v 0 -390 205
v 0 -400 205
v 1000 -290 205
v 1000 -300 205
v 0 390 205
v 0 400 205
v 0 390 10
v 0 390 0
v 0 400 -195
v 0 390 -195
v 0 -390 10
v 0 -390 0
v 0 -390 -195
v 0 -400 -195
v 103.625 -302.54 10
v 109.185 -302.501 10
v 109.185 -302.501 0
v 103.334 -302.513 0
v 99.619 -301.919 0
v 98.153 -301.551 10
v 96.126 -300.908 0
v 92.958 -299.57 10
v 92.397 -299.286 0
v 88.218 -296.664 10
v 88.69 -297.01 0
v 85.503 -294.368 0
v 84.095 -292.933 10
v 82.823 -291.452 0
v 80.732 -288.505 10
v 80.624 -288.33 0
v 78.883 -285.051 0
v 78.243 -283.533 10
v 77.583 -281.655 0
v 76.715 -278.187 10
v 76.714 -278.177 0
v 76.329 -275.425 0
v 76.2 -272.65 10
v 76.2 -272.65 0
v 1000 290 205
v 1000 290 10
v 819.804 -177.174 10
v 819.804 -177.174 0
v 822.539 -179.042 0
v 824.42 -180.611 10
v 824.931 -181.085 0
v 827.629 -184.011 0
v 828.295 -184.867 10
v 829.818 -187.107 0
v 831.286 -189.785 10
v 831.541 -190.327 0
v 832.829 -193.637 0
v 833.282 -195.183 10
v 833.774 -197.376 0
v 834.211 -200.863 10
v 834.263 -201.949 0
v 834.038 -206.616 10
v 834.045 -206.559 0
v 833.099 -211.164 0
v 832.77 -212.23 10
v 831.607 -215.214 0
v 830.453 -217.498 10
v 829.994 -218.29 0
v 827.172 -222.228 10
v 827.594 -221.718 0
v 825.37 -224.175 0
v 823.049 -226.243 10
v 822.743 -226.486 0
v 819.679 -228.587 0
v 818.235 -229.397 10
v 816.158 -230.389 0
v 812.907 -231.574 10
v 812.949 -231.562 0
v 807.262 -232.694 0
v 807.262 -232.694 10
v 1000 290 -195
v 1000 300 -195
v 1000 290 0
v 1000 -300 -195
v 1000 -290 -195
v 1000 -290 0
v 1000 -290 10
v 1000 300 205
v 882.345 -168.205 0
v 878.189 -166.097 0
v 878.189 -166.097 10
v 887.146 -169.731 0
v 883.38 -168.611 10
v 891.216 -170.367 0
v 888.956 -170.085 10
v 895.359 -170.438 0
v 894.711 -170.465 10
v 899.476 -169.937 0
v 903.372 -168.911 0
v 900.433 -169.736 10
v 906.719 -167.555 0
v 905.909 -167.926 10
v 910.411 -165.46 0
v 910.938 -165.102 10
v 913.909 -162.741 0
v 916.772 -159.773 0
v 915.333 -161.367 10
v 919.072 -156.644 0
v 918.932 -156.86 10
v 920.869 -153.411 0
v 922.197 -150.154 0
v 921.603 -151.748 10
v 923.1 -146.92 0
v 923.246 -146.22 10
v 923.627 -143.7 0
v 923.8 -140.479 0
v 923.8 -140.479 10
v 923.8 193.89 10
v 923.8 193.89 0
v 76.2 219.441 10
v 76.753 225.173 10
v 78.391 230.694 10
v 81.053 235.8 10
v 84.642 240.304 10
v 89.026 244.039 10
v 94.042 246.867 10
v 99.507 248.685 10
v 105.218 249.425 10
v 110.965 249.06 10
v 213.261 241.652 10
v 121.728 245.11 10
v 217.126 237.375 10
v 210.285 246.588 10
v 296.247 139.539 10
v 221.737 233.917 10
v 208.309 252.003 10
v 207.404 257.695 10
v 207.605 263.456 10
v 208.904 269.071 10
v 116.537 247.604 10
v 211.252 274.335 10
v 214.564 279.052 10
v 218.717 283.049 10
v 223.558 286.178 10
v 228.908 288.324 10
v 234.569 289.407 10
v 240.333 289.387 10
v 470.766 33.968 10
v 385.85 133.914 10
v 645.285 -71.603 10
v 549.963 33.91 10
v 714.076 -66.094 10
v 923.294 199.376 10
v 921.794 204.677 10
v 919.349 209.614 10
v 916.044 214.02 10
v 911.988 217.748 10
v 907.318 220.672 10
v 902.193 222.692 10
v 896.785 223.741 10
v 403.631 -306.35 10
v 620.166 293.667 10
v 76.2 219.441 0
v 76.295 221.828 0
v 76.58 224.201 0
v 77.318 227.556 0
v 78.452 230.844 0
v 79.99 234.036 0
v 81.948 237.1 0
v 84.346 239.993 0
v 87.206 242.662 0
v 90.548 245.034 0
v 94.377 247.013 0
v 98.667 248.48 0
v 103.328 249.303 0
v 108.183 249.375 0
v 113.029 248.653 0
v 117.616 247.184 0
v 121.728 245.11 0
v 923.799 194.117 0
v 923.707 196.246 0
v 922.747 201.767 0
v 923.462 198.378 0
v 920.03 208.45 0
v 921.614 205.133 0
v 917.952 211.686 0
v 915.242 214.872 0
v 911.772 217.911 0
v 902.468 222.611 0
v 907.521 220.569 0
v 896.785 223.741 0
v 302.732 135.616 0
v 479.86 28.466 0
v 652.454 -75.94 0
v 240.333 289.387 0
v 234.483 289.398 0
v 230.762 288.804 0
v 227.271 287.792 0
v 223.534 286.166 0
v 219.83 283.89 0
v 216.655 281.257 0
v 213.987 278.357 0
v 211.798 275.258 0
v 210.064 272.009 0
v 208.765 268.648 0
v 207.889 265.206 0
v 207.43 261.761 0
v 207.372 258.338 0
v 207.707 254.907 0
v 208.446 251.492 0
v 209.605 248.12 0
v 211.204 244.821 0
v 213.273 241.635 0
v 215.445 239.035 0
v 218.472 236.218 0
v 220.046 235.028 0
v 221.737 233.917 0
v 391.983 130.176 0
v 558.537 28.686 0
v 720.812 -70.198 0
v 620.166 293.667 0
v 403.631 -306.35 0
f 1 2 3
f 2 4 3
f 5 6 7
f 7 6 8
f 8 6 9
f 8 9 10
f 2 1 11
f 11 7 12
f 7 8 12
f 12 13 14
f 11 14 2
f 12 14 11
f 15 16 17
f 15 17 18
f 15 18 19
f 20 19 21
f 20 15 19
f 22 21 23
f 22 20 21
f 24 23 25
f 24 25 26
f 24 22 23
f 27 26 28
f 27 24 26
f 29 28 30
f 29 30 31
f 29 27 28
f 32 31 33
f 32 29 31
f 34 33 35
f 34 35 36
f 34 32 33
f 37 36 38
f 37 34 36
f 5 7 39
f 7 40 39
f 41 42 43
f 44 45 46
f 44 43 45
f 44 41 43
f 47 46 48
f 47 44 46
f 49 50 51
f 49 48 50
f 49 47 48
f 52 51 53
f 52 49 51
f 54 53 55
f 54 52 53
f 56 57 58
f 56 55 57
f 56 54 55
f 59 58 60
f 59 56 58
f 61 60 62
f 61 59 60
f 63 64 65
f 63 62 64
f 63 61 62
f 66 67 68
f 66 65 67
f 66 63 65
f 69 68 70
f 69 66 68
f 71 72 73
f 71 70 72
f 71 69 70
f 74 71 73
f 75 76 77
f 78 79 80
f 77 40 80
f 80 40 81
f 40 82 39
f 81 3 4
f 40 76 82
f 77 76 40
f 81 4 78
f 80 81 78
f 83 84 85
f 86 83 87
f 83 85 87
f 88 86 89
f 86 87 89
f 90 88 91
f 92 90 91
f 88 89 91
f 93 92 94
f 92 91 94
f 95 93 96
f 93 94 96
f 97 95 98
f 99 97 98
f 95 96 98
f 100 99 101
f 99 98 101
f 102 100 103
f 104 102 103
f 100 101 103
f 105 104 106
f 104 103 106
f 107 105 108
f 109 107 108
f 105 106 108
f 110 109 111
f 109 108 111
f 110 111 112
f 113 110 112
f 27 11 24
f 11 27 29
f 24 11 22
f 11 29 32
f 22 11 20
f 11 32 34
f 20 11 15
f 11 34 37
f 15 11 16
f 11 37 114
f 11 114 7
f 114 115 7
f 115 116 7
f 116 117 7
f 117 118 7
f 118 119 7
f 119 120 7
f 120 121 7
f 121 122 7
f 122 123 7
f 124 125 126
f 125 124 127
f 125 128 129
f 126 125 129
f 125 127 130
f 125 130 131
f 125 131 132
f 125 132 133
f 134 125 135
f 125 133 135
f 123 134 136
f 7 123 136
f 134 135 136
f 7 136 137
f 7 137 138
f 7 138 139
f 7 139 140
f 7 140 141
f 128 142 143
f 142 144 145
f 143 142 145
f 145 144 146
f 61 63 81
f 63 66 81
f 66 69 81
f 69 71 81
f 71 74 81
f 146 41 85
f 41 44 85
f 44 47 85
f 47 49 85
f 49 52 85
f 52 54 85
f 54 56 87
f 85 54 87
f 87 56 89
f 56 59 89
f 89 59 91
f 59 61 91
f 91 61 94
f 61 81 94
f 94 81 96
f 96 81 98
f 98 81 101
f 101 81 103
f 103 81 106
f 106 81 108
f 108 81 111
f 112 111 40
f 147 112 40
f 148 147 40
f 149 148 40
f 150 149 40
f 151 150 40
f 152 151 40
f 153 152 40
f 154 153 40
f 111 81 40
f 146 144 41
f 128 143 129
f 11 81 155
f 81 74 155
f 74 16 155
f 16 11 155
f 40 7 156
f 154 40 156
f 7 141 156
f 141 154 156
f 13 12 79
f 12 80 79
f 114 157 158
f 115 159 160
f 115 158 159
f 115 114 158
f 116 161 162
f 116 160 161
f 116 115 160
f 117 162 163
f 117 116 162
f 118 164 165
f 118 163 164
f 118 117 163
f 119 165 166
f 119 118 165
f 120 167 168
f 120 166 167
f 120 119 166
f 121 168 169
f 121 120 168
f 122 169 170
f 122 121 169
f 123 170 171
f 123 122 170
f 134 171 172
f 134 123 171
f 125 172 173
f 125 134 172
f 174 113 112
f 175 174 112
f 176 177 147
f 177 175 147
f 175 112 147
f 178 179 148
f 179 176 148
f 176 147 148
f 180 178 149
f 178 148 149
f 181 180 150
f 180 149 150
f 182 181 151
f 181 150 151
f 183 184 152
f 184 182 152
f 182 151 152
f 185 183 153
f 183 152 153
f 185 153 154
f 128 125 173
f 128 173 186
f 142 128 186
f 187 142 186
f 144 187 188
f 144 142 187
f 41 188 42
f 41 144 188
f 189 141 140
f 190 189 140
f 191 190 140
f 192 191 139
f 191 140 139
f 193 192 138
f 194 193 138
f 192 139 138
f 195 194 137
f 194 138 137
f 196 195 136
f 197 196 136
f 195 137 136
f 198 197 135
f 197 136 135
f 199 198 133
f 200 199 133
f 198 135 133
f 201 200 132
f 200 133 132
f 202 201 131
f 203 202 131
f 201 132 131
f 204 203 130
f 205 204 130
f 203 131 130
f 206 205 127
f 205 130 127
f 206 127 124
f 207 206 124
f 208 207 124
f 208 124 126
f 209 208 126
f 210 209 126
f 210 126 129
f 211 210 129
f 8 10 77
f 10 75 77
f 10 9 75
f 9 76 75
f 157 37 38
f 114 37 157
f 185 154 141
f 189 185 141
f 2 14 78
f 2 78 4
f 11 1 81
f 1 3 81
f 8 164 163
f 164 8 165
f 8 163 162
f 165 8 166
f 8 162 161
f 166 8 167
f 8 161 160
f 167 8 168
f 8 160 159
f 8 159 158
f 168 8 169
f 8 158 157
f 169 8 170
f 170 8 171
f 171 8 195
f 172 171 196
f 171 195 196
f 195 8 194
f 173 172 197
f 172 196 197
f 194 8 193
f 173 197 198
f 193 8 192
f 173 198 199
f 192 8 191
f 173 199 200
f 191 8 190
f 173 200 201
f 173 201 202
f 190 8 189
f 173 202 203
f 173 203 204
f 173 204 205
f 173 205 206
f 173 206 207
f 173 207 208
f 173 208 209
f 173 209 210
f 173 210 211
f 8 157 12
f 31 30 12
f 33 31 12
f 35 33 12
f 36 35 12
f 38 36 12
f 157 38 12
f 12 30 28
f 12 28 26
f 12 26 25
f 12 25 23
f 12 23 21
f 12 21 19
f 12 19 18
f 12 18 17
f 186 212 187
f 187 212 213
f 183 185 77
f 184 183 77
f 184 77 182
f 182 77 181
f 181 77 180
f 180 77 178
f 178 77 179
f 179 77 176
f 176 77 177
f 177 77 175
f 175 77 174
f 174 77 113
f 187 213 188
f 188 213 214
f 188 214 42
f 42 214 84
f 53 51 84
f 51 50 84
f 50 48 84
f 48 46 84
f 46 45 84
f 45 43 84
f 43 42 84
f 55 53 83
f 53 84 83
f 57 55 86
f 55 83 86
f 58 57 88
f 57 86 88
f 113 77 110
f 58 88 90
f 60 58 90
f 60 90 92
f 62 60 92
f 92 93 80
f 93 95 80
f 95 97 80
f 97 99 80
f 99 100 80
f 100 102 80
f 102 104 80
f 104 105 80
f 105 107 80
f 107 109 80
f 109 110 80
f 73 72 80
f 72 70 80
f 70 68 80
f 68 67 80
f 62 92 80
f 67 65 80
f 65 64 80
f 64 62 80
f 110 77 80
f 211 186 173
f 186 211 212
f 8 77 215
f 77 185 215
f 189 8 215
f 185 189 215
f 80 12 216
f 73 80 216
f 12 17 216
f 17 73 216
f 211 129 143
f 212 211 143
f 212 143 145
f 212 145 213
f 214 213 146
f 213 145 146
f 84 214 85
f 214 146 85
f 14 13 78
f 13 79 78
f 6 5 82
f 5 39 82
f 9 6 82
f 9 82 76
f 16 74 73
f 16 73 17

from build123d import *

# Parameters (mm, degrees)
CUT_EXTRUDE1_DEPTH = 206.0000001


with BuildPart() as part:
    # Sketch1 → Loft4 section 0
    with BuildSketch(Plane(origin=(0, 0, 0), x_dir=(0, 0, -1), z_dir=(1, 0, 0))):
        Polygon((-205, 400), (195, 400), (195, 390), (0, 390), (0, -390), (195, -390), (195, -400), (-205, -400), (-205, -390), (-10, -390), (-10, 390), (-205, 390), align=None)
    # Sketch4 → Loft4 section 1
    with BuildSketch(Plane(origin=(1000, 0, -1000), x_dir=(0, 0, 1), z_dir=(-1, 0, 0))):
        Polygon((805, 300), (1205, 300), (1205, 290), (1010, 290), (1010, -290), (1205, -290), (1205, -300), (805, -300), (805, -290), (1000, -290), (1000, 290), (805, 290), align=None)
    loft()

    # Sketch6 → Cut-Extrude1 (cut, through all)
    with BuildSketch(Plane.XY.offset(10)):
        with BuildLine():
            Line((221.736940013, 233.917126741), (878.189220239, -166.0970465))
            ThreePointArc((878.189220239, -166.0970465), (908.491436403, -166.635109102), (923.8, -140.478624315))
            Line((923.8, -140.478624315), (923.8, 193.890320904))
            ThreePointArc((923.8, 193.890320904), (916.043576007, 214.020480527), (896.785111571, 223.74143661))
            Line((896.785111571, 223.74143661), (240.332831344, 289.386664633))
            ThreePointArc((240.332831344, 289.386664633), (208.903576567, 269.071308844), (221.736940013, 233.917126741))
        make_face()
        with BuildLine():
            Line((121.727711267, 245.109508509), (819.804188988, -177.17381685))
            ThreePointArc((819.804188988, -177.17381685), (833.539047237, -209.453423865), (807.261589291, -232.693788838))
            Line((807.261589291, -232.693788838), (109.185111571, -302.50143661))
            ThreePointArc((109.185111571, -302.50143661), (86.069840377, -294.89389691), (76.2, -272.650320904))
            Line((76.2, -272.650320904), (76.2, 219.440652228))
            ThreePointArc((76.2, 219.440652228), (91.466218035, 245.573307451), (121.727711267, 245.109508509))
        make_face()
    extrude(amount=-CUT_EXTRUDE1_DEPTH, mode=Mode.SUBTRACT)


solid = part.part
